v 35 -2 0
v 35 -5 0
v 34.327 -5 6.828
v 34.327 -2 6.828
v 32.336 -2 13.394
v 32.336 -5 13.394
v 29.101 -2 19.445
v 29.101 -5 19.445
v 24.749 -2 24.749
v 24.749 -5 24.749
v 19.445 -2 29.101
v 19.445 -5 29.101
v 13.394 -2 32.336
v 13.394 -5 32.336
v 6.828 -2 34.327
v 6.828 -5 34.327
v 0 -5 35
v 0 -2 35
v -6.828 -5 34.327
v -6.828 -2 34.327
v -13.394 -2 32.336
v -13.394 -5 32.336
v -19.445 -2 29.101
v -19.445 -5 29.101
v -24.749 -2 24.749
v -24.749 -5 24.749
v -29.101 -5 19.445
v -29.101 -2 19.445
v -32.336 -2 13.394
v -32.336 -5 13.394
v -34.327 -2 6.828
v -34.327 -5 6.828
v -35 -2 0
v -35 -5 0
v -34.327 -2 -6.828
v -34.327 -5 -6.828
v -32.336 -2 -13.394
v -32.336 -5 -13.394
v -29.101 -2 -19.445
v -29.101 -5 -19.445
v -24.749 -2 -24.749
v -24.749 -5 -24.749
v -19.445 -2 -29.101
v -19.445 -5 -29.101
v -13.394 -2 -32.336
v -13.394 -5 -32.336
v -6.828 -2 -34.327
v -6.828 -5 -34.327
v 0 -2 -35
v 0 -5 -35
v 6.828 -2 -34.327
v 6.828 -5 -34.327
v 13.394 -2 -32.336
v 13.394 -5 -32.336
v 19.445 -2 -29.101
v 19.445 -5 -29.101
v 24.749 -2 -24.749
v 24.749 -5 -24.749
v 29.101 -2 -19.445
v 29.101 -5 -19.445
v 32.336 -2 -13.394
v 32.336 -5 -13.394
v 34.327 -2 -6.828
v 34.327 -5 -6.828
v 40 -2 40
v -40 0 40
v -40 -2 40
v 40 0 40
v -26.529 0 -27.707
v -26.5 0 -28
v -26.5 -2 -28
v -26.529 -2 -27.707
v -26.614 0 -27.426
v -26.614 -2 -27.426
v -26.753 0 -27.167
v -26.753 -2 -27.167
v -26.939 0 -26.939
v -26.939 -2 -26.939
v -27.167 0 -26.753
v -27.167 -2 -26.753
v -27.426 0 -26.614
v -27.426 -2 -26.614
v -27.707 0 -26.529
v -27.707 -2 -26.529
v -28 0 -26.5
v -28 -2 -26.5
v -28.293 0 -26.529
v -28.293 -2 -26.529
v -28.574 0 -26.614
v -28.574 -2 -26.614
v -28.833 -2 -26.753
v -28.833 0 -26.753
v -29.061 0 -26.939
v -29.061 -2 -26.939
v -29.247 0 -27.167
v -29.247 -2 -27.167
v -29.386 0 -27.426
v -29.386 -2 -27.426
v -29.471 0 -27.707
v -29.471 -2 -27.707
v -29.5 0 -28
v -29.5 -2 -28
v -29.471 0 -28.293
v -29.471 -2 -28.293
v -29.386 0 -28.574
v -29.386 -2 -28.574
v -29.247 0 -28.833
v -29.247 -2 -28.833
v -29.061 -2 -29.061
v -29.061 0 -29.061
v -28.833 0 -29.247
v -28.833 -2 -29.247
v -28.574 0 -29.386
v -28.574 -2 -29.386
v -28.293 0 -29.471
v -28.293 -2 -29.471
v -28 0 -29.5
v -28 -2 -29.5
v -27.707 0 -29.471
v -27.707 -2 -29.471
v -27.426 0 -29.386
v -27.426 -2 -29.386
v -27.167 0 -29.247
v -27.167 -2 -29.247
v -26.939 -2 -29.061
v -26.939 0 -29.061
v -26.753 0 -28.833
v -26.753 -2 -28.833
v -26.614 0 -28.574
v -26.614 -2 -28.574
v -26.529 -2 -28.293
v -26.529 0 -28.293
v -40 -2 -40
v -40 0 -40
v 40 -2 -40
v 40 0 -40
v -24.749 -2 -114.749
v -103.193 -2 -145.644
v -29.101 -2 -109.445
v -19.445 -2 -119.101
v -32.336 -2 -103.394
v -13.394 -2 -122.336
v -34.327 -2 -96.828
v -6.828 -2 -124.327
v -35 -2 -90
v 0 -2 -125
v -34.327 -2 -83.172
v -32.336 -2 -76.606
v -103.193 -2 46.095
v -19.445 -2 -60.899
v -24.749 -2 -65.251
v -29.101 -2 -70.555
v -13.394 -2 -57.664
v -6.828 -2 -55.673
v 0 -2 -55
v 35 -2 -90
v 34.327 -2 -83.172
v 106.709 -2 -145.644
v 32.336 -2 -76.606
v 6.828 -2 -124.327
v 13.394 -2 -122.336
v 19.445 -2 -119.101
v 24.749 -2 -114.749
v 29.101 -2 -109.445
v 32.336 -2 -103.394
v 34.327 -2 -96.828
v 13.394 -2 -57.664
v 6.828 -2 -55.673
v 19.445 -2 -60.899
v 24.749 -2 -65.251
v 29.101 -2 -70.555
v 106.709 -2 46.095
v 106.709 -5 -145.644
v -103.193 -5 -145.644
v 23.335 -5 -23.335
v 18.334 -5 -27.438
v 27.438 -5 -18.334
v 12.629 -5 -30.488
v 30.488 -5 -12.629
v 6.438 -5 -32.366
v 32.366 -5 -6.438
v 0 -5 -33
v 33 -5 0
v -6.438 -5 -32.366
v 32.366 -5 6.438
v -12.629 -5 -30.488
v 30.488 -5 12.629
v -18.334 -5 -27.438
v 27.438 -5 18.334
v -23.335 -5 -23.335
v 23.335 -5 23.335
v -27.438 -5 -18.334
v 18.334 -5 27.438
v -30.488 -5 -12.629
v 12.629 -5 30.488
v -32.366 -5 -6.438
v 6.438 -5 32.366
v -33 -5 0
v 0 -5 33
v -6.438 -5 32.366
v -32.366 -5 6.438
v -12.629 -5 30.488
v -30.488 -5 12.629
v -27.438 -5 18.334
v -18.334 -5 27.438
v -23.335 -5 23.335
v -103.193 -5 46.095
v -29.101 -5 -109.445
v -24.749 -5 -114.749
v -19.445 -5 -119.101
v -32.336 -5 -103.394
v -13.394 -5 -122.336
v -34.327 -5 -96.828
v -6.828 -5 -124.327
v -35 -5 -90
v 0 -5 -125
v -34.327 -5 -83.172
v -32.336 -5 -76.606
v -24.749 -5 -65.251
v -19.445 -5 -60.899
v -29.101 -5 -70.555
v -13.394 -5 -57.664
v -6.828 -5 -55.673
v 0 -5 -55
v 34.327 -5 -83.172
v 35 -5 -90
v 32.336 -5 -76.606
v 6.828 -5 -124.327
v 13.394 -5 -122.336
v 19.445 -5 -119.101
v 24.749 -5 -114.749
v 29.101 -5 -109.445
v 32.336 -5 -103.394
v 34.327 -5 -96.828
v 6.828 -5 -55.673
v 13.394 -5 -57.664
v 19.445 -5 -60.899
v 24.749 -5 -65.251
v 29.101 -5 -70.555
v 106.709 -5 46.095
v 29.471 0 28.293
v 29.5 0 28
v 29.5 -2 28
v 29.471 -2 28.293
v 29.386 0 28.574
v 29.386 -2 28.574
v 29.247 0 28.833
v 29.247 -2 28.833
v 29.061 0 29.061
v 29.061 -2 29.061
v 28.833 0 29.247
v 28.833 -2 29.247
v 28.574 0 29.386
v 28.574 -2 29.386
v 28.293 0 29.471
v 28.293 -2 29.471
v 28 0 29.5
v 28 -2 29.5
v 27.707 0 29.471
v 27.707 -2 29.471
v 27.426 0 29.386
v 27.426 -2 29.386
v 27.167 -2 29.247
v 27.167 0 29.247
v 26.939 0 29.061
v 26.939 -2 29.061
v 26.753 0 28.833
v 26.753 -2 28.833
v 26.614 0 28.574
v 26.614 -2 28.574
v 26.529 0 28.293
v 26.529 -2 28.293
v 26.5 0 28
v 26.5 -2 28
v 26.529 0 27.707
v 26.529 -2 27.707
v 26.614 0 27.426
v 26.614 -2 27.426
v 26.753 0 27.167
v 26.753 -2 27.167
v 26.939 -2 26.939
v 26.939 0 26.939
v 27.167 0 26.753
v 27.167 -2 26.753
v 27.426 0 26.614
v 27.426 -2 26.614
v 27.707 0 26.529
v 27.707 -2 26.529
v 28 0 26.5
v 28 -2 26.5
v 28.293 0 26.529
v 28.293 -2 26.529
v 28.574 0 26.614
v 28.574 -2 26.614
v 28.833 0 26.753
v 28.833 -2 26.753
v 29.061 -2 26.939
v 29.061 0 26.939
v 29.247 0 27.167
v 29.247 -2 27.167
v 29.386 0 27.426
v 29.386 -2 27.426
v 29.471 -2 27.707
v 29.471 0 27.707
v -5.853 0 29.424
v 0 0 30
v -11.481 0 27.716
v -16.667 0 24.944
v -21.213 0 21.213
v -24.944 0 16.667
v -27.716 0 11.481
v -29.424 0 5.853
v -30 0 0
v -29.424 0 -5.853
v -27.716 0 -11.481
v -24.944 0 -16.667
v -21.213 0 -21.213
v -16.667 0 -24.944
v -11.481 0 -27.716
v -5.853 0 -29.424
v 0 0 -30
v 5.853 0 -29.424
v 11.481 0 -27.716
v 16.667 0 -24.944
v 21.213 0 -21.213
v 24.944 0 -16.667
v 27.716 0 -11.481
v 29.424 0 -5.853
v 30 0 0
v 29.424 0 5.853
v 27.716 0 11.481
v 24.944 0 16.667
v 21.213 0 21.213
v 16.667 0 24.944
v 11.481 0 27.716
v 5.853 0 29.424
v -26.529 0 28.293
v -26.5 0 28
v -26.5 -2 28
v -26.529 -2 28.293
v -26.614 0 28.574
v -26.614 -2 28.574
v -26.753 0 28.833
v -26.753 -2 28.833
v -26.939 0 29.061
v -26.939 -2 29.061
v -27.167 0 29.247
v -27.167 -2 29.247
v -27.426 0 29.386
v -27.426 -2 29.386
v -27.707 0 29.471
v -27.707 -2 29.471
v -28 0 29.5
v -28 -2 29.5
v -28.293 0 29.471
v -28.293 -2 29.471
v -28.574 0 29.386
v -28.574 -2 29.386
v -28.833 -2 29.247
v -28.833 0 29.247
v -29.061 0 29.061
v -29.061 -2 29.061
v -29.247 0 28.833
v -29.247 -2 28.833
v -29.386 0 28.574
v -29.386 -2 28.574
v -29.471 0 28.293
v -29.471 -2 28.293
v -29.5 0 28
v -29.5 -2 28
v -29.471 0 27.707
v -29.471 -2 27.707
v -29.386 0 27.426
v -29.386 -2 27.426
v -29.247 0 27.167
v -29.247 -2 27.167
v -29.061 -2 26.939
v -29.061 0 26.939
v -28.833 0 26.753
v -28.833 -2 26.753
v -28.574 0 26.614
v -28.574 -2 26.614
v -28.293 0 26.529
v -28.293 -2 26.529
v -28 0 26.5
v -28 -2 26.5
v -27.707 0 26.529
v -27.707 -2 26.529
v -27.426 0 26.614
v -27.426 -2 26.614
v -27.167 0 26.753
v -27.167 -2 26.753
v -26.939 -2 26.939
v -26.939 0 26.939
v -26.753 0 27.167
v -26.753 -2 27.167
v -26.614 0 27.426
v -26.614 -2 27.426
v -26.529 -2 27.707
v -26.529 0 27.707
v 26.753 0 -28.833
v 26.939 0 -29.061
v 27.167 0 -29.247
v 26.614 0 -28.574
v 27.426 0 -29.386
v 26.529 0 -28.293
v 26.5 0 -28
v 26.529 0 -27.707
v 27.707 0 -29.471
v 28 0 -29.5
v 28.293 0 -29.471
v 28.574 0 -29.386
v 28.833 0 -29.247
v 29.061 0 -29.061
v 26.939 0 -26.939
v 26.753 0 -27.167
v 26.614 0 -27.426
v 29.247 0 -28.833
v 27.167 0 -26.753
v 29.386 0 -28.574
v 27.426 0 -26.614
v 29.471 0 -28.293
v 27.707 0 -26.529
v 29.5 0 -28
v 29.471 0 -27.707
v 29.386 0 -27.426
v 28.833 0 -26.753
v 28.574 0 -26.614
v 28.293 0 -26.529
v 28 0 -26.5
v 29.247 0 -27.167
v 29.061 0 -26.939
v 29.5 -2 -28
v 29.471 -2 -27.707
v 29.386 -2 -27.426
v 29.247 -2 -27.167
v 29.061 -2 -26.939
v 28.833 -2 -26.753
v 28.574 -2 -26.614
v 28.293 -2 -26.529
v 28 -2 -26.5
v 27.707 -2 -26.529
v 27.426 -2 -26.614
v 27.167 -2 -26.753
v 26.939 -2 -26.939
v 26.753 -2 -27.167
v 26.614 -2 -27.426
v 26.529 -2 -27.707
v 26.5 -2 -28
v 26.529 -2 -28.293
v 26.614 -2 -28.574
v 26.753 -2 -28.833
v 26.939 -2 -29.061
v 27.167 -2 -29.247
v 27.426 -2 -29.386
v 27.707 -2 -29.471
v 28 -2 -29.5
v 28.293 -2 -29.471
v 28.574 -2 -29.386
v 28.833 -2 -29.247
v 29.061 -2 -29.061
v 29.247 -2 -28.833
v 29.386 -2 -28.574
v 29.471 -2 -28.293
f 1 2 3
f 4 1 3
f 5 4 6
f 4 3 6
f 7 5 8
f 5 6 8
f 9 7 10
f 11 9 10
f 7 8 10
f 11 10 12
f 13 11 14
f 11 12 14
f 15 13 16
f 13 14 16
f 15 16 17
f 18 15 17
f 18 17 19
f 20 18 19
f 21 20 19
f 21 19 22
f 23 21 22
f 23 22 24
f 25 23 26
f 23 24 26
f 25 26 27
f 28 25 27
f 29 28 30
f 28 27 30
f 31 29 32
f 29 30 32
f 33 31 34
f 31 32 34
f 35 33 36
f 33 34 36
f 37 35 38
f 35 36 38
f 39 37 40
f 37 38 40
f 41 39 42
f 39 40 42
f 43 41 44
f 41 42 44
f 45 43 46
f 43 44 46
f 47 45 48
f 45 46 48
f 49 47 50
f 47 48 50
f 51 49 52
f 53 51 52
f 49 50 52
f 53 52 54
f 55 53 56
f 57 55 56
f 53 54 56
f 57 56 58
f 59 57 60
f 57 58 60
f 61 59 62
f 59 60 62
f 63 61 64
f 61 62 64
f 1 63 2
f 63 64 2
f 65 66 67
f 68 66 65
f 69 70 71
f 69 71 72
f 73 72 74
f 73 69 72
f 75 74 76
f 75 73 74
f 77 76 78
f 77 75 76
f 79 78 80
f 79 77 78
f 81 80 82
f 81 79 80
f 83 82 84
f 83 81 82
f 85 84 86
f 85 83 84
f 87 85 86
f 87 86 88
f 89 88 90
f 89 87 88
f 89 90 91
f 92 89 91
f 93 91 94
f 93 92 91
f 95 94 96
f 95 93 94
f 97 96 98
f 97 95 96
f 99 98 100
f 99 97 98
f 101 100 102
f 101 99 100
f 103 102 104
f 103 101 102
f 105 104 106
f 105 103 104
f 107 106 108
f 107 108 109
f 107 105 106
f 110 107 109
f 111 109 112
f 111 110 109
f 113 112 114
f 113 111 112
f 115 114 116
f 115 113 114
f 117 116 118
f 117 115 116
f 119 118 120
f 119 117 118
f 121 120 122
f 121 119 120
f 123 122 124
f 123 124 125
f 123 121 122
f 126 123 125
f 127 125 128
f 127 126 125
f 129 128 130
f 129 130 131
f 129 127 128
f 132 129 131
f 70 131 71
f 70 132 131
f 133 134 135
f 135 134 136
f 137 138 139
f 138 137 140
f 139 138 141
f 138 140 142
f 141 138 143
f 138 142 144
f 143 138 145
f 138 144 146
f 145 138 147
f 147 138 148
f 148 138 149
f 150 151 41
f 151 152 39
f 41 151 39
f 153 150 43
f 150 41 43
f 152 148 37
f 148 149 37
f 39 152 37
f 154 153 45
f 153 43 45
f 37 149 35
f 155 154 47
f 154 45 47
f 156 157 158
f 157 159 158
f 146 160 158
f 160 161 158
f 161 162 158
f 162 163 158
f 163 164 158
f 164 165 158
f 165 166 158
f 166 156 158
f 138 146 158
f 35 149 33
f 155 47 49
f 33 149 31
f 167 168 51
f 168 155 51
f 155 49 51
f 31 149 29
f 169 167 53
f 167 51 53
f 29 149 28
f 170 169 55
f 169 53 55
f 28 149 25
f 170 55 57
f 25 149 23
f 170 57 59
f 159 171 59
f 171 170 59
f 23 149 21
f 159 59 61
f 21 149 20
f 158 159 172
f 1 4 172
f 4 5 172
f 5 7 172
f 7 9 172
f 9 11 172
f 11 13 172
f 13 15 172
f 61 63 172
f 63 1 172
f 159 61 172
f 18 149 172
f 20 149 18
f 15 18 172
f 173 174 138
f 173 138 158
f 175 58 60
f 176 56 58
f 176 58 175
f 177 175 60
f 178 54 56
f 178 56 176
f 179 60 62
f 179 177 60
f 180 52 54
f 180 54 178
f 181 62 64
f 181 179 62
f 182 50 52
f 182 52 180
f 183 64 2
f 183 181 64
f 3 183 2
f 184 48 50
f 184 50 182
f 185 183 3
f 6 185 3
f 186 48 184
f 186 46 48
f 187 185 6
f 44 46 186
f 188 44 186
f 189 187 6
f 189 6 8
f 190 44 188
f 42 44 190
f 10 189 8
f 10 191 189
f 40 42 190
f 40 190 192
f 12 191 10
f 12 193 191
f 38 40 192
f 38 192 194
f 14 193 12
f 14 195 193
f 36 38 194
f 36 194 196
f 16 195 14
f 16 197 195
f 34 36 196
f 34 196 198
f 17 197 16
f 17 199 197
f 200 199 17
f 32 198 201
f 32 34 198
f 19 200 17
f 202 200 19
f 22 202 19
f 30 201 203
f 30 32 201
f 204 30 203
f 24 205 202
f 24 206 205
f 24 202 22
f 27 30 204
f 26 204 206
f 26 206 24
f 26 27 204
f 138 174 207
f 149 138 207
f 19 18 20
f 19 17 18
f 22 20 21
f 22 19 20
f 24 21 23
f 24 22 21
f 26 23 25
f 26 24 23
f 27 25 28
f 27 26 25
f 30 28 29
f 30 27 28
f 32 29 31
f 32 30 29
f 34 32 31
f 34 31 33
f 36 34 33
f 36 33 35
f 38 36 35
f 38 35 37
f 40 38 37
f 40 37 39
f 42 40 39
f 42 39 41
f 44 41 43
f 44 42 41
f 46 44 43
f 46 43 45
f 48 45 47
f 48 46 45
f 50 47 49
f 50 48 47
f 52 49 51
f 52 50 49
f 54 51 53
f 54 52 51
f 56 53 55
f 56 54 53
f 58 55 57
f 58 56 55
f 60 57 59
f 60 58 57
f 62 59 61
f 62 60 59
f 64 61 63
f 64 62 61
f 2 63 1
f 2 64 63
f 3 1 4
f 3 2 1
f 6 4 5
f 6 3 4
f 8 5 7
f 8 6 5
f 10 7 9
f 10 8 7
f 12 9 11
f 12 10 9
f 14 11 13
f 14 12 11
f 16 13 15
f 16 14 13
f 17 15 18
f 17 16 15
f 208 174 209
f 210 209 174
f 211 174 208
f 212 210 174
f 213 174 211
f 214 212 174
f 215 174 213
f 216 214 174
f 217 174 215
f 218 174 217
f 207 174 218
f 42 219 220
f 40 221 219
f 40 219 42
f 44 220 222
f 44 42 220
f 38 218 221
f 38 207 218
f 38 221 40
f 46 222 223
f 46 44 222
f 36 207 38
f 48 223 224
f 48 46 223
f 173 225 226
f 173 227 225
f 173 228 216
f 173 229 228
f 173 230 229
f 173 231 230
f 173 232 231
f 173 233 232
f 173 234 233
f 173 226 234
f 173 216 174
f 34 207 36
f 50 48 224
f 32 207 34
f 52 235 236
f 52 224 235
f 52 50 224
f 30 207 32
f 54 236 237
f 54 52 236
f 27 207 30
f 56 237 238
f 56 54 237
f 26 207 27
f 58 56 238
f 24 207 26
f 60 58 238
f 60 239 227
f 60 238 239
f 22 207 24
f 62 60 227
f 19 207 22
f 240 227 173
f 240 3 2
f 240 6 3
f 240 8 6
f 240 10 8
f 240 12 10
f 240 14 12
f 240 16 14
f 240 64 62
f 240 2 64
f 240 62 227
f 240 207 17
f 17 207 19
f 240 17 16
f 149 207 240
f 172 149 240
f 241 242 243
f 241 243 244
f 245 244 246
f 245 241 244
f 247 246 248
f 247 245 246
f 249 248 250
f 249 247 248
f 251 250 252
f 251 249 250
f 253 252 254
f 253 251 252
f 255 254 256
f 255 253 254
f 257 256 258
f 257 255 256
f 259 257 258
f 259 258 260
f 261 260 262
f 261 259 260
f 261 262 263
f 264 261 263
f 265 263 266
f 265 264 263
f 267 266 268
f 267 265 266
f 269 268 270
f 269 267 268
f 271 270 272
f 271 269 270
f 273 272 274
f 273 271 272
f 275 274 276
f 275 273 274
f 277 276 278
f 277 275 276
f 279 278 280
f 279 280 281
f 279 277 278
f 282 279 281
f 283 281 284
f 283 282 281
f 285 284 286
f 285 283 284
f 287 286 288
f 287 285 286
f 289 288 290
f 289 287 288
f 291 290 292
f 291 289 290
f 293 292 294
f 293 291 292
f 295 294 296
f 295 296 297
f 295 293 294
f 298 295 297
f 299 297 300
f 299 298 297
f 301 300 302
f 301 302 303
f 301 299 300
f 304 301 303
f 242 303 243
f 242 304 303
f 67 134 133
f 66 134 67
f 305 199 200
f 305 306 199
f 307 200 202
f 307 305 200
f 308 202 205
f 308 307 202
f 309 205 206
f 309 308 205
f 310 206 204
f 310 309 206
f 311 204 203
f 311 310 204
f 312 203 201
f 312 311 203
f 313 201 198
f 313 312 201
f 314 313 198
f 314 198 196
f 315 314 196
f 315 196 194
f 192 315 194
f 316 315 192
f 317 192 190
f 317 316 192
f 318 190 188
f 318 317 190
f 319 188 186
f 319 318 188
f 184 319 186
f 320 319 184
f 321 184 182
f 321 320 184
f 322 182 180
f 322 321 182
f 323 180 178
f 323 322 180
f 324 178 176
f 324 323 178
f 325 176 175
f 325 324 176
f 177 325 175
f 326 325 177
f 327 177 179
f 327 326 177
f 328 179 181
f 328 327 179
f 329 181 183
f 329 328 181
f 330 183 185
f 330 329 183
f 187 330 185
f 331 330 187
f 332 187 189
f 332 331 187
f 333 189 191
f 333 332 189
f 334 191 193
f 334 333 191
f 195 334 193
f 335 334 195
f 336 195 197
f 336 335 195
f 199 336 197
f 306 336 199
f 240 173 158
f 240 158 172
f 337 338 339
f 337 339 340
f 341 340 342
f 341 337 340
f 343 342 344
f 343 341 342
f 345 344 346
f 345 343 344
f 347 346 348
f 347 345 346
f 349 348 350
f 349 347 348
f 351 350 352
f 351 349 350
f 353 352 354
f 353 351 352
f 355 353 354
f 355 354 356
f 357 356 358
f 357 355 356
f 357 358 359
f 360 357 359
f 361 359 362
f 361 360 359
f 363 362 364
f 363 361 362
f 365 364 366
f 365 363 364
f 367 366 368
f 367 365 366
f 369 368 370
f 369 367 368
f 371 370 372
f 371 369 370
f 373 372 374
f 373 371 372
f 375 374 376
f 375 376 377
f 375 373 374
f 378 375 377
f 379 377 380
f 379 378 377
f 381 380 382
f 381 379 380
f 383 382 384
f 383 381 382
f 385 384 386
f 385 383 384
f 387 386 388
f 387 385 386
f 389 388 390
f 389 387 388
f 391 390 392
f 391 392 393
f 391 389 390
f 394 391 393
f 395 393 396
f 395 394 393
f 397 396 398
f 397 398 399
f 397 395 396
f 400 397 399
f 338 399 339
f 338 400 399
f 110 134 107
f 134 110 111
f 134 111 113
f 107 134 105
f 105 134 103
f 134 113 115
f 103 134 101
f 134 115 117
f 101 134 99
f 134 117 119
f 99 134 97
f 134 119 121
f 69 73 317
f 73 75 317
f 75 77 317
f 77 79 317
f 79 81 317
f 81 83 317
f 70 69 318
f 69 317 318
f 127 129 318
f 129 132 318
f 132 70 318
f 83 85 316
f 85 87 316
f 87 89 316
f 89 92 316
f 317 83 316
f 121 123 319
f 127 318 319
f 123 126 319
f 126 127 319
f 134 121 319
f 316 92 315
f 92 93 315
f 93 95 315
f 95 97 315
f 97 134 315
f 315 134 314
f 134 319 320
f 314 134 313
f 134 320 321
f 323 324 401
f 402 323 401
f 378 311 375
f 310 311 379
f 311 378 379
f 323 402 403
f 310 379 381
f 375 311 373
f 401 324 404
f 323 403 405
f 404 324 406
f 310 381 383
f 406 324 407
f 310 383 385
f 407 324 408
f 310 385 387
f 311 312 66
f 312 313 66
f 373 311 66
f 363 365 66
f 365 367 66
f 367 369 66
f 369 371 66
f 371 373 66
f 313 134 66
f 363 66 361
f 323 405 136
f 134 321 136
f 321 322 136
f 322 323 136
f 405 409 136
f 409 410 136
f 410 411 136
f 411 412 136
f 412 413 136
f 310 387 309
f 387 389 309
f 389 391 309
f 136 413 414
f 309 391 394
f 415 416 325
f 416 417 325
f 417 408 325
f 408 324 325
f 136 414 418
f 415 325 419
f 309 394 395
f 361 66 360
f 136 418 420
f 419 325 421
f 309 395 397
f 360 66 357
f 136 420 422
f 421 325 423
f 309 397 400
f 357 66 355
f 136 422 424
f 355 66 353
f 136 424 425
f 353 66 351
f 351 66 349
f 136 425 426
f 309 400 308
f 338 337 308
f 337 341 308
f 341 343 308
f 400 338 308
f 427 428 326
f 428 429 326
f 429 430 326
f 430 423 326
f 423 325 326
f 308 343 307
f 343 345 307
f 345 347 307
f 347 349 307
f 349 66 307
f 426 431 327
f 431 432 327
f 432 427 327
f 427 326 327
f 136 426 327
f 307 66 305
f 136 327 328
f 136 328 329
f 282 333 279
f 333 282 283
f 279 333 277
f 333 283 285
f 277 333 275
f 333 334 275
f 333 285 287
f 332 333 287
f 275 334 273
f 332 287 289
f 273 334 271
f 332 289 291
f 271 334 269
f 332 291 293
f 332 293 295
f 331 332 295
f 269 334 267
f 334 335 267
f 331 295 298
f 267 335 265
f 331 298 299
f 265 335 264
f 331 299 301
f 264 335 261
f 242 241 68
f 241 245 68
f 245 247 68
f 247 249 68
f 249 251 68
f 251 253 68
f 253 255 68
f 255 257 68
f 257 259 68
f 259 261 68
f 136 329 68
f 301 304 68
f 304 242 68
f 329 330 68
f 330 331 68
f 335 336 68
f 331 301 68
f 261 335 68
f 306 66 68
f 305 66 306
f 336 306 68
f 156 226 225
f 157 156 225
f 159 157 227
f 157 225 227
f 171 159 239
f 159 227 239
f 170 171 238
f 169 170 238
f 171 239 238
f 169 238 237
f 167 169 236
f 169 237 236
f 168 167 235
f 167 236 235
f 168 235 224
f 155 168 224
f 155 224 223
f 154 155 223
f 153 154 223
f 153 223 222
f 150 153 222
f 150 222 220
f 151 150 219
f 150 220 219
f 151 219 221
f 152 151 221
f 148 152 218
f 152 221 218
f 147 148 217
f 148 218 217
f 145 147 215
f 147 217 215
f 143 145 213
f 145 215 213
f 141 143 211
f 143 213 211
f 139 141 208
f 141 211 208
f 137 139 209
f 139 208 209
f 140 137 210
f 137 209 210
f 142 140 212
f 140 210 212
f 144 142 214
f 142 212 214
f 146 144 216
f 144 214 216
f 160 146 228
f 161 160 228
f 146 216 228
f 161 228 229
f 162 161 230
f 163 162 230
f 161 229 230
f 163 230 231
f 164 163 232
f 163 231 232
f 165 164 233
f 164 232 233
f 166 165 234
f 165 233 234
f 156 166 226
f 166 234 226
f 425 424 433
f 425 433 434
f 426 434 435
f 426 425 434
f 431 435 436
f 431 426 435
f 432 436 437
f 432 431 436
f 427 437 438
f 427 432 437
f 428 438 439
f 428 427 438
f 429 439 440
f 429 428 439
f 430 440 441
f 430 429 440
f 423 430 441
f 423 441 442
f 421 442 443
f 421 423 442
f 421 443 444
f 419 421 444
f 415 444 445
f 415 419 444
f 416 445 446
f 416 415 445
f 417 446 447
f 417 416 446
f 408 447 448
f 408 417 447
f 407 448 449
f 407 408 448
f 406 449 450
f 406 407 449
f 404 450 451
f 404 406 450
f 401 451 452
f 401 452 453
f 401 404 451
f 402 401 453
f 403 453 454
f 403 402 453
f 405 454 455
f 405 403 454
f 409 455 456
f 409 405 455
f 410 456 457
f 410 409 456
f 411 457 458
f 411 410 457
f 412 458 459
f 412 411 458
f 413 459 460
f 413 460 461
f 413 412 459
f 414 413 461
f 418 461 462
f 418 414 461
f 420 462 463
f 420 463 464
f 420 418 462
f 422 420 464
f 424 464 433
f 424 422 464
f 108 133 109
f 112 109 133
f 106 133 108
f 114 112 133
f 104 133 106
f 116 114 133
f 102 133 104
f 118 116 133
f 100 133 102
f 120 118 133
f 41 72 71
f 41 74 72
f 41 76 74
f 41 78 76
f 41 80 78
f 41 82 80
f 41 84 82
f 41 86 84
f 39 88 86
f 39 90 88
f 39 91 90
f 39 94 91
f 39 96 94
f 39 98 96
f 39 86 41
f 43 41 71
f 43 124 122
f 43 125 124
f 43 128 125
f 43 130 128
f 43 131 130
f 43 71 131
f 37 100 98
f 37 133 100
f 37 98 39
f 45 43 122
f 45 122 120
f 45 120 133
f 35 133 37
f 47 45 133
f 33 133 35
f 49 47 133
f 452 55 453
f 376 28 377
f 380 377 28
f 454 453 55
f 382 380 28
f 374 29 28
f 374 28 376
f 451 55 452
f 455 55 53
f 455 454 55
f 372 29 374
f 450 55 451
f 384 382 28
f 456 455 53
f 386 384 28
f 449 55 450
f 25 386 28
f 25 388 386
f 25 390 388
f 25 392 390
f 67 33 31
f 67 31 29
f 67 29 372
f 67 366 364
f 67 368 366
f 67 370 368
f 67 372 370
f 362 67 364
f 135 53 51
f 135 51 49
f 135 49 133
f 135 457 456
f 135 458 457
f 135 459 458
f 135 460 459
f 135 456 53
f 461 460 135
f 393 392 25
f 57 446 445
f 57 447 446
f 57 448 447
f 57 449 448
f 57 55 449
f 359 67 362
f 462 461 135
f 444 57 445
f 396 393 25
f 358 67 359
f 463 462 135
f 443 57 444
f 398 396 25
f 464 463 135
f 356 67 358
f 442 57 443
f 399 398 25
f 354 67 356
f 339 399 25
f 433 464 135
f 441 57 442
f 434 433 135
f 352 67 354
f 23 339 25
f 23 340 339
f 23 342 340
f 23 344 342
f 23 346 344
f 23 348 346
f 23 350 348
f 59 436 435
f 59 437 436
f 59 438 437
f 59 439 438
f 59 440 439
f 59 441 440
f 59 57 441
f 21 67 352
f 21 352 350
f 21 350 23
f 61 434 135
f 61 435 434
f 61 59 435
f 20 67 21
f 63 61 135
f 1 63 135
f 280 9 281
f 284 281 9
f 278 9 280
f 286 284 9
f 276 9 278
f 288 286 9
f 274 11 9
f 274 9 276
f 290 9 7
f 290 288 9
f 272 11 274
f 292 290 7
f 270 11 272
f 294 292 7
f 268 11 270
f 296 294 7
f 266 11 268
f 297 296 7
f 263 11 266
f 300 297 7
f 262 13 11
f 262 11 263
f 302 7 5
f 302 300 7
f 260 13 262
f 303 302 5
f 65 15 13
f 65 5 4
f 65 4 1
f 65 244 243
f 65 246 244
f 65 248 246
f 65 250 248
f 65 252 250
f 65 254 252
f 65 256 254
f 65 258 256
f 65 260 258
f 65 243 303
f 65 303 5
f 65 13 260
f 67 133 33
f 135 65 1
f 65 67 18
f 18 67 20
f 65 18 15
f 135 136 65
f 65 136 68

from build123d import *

# Parameters (mm, degrees)
F1_W     = 209.9018618464
F1_H     = 191.7395107448
F1_R     = 35
F2_DEPTH = 3
F5_W     = 80
F5_H     = 80
F5_R     = 1.5
F5_R_2   = 35
F6_DEPTH = 2


with BuildPart() as f2:
    # F1 (on offset) → F2 (new body)
    with BuildSketch(Plane.XZ.offset(5)):
        with Locations((1.7582438886, -49.7746858746)):
            Rectangle(F1_W, F1_H)
        with Locations((0, -90)):
            Circle(F1_R, mode=Mode.SUBTRACT)
        Circle(F1_R, mode=Mode.SUBTRACT)
    extrude(amount=-F2_DEPTH)


with BuildPart() as f4:
    # F3 (on Right) → F4 (revolve)
    with BuildSketch(Plane.YZ):
        Polygon((0, 35), (-5, 35), (-5, 33), (0, 30), align=None)
    revolve(axis=Axis((0, 1.602868408, 0), (0, -1, 0)))

    # F5 (on Front) → F6 (join)
    with BuildSketch(Plane.XZ):
        Rectangle(F5_W, F5_H)
        with Locations((-28, -28)):
            Circle(F5_R, mode=Mode.SUBTRACT)
        with Locations((28, -28)):
            Circle(F5_R, mode=Mode.SUBTRACT)
        with Locations((-28, 28)):
            Circle(F5_R, mode=Mode.SUBTRACT)
        Circle(F5_R_2, mode=Mode.SUBTRACT)
        with Locations((28, 28)):
            Circle(F5_R, mode=Mode.SUBTRACT)
    extrude(amount=F6_DEPTH)


solid = Compound([f2.part, f4.part])
